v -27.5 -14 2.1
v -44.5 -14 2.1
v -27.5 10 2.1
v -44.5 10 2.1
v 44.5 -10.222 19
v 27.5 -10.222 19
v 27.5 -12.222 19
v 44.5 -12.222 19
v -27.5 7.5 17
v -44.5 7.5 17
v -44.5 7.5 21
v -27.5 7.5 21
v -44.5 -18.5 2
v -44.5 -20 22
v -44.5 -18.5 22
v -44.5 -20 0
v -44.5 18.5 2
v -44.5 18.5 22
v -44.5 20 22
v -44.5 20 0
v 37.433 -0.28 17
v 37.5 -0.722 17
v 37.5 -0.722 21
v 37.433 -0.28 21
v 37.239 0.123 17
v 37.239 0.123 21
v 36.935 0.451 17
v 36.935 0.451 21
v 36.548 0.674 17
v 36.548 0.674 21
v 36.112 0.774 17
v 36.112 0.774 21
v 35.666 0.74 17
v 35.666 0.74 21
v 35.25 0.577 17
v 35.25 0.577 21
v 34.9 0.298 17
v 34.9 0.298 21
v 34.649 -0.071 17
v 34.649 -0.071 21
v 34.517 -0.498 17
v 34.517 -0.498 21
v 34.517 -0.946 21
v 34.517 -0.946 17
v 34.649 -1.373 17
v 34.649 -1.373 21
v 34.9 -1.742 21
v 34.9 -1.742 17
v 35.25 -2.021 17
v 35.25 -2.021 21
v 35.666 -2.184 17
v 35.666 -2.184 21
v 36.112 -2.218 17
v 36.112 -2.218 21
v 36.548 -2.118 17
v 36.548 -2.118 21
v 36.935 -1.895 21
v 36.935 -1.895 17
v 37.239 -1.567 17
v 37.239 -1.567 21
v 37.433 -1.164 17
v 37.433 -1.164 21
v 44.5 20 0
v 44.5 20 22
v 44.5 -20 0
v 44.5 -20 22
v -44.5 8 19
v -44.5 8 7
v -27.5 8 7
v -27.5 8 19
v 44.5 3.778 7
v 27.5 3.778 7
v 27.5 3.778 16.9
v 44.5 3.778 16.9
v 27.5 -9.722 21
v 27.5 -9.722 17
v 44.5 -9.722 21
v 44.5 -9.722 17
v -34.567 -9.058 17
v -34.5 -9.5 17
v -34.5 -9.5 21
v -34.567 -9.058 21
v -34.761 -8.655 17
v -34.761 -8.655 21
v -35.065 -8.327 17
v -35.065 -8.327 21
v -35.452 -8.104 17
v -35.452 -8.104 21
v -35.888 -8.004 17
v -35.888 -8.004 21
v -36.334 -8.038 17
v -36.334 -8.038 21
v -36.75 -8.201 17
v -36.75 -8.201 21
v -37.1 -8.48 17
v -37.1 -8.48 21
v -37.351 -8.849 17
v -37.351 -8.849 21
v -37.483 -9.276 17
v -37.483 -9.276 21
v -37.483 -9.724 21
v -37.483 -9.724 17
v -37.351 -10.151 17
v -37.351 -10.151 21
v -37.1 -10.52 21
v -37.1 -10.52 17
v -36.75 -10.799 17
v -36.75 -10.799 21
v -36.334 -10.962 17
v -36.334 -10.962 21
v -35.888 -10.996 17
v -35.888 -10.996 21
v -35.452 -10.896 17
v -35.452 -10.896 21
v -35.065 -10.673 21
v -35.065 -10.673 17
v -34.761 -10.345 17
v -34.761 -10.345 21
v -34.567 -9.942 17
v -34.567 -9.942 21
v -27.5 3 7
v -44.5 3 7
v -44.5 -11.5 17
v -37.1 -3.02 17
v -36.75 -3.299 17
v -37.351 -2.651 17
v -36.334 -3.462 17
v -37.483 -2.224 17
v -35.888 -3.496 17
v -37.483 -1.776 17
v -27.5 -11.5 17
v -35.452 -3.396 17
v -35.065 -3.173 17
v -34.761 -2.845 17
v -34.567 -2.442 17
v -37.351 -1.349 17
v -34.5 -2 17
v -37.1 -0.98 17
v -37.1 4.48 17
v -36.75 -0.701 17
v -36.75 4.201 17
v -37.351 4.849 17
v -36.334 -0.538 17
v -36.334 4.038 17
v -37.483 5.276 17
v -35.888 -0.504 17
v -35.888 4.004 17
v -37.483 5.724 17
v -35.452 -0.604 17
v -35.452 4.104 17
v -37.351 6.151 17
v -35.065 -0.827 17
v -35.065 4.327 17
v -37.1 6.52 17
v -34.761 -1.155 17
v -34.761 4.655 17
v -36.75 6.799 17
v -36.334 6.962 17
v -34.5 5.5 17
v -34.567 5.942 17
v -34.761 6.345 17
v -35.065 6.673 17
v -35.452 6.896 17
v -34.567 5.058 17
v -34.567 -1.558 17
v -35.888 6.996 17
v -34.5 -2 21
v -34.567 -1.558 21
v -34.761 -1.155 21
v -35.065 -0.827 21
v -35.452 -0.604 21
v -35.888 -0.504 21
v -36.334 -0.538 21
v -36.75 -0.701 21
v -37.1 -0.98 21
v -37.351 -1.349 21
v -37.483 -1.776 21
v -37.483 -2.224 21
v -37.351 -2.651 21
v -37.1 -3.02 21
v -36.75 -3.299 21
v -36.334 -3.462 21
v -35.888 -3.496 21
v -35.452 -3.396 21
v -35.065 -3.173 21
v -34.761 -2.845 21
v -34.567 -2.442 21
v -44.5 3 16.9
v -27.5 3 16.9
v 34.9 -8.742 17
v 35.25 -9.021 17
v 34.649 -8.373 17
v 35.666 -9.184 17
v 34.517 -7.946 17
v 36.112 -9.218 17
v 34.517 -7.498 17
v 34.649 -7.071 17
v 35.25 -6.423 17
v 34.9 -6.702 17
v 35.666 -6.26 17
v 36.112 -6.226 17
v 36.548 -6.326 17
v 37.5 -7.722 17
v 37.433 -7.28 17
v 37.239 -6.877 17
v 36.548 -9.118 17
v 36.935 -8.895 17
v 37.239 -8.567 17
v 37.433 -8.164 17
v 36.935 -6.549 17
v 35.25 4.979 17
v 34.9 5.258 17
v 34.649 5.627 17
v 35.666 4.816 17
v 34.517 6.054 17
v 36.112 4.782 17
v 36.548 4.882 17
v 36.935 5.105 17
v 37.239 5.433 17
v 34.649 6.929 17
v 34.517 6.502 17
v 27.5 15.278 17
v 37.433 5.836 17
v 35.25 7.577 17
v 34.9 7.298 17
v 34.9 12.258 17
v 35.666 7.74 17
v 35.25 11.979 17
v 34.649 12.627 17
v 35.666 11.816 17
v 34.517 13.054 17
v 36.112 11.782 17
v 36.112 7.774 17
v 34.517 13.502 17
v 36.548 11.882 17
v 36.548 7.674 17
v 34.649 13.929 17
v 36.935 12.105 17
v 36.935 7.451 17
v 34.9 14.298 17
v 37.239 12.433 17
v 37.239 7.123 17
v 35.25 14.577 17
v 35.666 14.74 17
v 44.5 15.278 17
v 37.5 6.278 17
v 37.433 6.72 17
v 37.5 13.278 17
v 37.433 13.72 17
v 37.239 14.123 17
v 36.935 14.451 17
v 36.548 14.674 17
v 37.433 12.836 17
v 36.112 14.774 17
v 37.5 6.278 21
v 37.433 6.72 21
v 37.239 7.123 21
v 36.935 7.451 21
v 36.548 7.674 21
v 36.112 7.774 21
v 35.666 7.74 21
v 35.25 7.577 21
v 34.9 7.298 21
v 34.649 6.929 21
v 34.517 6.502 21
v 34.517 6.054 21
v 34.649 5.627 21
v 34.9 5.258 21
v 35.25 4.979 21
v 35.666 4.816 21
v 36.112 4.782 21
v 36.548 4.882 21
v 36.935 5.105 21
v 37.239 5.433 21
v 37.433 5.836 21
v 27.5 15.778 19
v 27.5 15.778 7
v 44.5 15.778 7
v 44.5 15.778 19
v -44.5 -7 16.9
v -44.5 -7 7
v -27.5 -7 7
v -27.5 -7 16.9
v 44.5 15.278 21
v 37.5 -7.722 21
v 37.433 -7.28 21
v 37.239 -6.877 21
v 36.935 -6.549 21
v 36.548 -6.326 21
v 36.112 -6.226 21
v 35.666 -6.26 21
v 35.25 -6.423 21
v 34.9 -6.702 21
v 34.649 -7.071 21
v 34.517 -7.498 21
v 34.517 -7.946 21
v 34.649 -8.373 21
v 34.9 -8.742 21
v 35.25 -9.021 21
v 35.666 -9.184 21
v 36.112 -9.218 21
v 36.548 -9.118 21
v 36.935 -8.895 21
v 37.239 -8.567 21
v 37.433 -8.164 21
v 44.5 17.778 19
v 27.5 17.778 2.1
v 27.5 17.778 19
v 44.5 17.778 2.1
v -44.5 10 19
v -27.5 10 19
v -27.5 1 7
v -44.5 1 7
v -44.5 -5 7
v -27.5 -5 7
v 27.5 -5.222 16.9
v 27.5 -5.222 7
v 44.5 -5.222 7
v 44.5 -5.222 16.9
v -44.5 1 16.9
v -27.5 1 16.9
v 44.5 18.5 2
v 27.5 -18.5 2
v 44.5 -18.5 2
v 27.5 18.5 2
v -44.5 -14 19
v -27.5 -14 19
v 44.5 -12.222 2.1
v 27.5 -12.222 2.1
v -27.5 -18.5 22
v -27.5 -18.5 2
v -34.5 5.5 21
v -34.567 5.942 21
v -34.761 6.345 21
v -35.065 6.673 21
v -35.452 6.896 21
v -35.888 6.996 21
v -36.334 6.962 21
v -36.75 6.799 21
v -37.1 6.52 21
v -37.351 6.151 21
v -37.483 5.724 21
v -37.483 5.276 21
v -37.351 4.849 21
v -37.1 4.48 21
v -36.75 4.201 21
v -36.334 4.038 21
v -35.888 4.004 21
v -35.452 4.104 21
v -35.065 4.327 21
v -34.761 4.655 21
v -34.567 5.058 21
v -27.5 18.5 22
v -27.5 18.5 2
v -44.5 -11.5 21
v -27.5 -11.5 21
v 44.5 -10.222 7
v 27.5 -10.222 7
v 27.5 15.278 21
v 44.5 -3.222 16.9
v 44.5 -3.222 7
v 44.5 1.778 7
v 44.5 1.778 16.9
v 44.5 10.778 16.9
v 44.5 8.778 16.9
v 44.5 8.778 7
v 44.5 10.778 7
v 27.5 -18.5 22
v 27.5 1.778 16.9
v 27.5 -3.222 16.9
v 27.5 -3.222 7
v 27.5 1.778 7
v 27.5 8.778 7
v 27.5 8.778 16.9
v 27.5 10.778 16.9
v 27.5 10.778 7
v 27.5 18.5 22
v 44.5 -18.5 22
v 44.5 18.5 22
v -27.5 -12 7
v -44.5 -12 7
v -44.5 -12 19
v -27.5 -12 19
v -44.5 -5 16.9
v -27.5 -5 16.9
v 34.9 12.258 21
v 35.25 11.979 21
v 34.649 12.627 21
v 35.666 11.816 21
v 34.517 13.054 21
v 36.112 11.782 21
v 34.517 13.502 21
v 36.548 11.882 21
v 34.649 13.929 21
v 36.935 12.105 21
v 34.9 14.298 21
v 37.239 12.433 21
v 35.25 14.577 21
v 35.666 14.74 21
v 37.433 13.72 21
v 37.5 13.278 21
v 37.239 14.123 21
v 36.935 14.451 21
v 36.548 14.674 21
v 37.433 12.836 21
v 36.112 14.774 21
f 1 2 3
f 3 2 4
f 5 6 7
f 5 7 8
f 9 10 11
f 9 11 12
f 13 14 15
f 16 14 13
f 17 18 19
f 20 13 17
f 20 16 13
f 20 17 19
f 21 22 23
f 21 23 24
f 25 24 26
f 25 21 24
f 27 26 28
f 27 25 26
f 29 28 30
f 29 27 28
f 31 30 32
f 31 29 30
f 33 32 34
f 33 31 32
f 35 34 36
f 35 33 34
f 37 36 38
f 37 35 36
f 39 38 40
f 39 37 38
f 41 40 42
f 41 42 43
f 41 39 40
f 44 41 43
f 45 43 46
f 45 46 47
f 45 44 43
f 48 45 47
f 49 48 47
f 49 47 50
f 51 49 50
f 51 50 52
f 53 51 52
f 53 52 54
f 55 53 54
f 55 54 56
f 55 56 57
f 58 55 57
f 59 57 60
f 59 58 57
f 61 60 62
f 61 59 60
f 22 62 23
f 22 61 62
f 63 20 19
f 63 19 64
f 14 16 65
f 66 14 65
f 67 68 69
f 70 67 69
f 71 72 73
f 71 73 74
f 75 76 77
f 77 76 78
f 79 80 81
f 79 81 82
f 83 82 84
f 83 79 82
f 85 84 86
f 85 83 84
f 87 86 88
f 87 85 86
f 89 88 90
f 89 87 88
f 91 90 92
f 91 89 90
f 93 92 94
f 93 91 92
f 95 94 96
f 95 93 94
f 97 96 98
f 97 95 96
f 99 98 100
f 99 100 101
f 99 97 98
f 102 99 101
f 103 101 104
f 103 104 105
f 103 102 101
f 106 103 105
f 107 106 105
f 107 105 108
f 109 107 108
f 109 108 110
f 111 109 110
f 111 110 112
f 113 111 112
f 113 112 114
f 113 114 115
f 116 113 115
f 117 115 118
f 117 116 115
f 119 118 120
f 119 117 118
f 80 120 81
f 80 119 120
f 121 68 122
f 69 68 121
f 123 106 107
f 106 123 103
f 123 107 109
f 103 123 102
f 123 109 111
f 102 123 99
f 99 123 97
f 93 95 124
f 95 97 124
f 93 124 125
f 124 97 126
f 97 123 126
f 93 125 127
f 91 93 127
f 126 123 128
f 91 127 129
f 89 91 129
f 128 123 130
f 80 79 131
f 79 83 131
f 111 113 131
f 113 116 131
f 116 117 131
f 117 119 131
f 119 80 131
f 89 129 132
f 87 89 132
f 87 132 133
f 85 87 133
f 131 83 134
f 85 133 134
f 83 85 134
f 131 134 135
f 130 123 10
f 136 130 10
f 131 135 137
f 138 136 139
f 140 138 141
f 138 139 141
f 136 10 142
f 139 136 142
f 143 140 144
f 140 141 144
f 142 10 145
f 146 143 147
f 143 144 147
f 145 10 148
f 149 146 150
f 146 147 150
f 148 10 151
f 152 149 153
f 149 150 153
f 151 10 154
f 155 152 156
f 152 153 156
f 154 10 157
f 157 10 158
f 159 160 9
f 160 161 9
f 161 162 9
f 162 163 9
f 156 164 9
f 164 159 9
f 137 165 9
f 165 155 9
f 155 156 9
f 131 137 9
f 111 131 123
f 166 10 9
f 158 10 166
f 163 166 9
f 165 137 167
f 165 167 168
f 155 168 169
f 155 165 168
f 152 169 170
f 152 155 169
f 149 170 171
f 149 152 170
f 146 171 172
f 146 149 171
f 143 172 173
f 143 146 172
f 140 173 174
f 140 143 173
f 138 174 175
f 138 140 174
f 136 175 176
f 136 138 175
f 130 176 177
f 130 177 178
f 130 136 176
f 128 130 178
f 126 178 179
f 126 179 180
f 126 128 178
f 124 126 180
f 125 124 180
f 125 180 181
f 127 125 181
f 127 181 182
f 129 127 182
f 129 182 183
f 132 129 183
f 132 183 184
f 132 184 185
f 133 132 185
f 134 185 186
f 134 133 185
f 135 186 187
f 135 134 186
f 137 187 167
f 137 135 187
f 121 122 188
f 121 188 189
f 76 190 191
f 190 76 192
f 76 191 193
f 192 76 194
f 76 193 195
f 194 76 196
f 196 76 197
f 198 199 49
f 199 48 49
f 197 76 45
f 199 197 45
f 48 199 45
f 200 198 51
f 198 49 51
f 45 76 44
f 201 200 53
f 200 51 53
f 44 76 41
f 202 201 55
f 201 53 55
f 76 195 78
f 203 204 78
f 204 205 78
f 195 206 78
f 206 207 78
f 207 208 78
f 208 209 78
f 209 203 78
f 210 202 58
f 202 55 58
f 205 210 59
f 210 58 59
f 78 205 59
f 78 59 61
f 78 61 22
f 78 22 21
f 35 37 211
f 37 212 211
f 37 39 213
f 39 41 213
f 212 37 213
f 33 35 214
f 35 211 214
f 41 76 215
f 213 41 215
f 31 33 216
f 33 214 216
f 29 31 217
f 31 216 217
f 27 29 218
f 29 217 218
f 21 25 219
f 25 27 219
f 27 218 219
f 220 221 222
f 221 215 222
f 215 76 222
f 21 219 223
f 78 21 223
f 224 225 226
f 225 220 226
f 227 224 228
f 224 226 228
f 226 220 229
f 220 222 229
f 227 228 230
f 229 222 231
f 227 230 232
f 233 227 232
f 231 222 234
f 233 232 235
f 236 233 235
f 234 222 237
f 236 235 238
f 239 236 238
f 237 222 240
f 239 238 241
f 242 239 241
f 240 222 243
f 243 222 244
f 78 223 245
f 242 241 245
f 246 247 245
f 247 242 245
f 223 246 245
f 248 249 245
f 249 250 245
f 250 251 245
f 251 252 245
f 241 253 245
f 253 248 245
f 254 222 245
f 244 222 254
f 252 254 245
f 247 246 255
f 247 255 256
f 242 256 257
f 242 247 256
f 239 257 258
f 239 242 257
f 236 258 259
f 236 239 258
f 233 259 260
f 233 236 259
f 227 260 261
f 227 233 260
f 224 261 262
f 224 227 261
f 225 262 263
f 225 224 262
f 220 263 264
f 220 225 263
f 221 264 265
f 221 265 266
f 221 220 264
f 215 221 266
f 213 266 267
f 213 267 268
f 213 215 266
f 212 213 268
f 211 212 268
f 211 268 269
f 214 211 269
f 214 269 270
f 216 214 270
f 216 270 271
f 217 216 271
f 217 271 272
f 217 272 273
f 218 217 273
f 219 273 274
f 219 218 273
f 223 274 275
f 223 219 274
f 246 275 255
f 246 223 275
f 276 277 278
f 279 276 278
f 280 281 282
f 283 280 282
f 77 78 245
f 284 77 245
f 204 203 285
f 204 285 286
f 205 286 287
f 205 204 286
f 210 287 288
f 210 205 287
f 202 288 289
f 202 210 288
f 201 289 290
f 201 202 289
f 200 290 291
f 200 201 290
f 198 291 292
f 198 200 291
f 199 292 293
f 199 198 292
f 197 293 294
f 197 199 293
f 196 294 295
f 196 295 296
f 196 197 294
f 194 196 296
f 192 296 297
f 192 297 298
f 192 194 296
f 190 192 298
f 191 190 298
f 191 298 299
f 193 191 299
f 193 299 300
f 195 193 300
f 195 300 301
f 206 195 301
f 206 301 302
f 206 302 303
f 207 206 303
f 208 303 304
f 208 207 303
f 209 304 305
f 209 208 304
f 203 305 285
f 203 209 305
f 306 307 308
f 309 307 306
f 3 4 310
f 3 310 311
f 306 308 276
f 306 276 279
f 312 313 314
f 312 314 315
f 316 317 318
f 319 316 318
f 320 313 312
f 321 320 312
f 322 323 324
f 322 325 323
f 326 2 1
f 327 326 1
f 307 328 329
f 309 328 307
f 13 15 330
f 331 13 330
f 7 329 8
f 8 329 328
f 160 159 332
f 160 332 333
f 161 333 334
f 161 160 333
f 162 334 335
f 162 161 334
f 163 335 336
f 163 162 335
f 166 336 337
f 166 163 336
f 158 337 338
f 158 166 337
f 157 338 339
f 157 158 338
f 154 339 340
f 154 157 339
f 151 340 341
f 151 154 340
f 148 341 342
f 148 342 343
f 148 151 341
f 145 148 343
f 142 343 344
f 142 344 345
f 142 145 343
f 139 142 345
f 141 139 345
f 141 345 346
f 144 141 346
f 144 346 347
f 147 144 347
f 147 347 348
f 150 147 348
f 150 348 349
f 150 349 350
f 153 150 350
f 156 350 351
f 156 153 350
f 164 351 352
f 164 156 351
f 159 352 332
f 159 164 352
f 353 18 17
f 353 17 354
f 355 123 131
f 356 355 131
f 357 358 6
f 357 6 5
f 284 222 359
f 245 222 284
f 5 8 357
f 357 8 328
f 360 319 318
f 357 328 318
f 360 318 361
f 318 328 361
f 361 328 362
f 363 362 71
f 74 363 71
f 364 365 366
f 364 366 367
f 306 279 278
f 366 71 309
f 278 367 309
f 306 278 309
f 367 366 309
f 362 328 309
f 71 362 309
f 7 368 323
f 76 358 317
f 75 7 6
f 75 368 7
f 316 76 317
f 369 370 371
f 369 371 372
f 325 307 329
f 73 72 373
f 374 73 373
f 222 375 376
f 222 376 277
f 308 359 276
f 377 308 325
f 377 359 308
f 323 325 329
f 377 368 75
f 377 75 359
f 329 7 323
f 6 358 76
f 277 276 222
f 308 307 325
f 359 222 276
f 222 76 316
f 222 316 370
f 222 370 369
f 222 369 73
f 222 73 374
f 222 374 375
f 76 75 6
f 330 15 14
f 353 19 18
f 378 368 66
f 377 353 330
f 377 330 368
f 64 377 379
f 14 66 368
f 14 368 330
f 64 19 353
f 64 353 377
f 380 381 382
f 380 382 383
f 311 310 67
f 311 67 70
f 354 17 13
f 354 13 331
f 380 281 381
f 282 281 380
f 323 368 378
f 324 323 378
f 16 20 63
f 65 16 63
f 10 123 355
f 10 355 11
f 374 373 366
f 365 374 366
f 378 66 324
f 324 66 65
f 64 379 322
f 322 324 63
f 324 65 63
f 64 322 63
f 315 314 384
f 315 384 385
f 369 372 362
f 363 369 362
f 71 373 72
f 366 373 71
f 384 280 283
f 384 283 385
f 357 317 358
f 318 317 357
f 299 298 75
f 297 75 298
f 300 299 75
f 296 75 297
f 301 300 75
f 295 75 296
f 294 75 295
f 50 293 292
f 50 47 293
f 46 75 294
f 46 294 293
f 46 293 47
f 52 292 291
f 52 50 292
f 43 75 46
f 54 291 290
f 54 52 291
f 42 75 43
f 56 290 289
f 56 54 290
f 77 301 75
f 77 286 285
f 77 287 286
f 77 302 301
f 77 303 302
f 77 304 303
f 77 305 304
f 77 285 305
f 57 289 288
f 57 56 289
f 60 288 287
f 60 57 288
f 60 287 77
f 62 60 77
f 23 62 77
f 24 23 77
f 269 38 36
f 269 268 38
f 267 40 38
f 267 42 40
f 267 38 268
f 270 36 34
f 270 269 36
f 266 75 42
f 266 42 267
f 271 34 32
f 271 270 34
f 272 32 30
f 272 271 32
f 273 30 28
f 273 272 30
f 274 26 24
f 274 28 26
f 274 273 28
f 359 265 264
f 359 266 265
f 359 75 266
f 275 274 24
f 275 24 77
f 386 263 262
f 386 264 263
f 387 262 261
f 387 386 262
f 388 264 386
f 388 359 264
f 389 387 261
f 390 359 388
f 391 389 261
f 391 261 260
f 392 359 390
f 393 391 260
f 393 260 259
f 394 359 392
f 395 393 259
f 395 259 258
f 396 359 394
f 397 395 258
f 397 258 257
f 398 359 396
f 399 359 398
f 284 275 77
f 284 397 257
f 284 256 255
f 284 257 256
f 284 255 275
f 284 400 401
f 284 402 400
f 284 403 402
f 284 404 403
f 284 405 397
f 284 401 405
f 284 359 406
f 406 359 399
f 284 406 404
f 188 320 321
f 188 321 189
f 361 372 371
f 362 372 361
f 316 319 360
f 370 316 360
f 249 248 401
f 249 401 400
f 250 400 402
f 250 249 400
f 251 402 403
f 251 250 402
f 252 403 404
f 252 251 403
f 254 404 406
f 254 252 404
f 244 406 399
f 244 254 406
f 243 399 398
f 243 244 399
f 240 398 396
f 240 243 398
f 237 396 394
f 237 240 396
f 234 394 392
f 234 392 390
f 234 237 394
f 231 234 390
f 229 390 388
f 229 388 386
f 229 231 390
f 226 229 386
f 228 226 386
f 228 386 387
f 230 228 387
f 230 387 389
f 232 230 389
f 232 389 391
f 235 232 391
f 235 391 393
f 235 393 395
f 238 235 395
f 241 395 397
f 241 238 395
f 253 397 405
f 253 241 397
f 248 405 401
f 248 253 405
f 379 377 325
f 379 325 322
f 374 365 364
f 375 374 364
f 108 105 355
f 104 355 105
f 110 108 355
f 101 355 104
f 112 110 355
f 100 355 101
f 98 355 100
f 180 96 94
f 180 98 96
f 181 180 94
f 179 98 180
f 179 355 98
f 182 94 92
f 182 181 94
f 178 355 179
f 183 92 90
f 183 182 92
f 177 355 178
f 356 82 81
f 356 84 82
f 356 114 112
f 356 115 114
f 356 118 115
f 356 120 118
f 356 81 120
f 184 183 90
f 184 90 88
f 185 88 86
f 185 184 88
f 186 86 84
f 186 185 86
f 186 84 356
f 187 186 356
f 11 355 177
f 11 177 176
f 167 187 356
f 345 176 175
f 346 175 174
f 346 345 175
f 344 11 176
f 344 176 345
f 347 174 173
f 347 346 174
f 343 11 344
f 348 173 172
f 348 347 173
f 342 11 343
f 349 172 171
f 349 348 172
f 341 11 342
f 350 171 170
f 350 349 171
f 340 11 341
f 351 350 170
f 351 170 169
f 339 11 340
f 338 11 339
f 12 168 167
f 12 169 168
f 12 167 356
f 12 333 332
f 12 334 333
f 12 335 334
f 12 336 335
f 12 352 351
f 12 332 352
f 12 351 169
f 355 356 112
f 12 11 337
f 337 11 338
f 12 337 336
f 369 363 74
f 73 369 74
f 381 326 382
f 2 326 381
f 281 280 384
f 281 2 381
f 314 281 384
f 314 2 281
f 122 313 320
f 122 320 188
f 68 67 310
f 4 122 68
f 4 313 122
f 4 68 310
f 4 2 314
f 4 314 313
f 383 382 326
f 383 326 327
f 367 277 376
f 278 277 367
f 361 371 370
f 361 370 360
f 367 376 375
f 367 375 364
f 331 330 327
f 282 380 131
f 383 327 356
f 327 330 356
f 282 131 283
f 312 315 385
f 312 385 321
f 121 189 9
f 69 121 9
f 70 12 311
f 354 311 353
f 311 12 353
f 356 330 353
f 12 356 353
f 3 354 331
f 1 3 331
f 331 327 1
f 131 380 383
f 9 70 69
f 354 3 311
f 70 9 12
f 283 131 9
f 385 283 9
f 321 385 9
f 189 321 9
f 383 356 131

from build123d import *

# Parameters (mm, degrees)
SKETCH1_W                 = 89
SKETCH1_H                 = 40
BOSS_EXTRUDE1_DEPTH       = 22
SKETCH2_W                 = 17
SKETCH2_H                 = 37
CUT_EXTRUDE1_DEPTH        = 20
SKETCH3_W                 = 17
SKETCH3_H                 = 2
BOSS_EXTRUDE2_DEPTH       = 17
BOSS_EXTRUDE10_DEPTH      = 2
BOSS_EXTRUDE10_DEPTH_BACK = 2
SKETCH4_W                 = 17
SKETCH4_H                 = 19
SKETCH4_R                 = 1.5
SKETCH5_W                 = 17
SKETCH5_H                 = 2
BOSS_EXTRUDE11_DEPTH      = 17
BOSS_EXTRUDE13_DEPTH      = 2
BOSS_EXTRUDE13_DEPTH_BACK = 2
SKETCH6_W                 = 17
SKETCH6_H                 = 25
SKETCH6_R                 = 1.5
SKETCH7_W                 = 0.1
SKETCH7_H                 = 2
CUT_EXTRUDE2_DEPTH        = 17
SKETCH8_W                 = 0.1
SKETCH8_H                 = 2
CUT_EXTRUDE11_DEPTH       = 17
SKETCH10_W                = 17
SKETCH10_H                = 5
SKETCH10_H_2              = 6
BOSS_EXTRUDE14_DEPTH      = 5
SKETCH11_W                = 0.1
SKETCH11_H                = 20
CUT_EXTRUDE12_DEPTH       = 17
SKETCH12_W                = 17
SKETCH12_H                = 5
BOSS_EXTRUDE15_DEPTH      = 5
SKETCH13_W                = 0.1
SKETCH13_H                = 26
CUT_EXTRUDE13_DEPTH       = 17


with BuildPart() as part:
    # Sketch1 → Boss-Extrude1 (new body)
    with BuildSketch(Plane.XY):
        Rectangle(SKETCH1_W, SKETCH1_H)
    extrude(amount=BOSS_EXTRUDE1_DEPTH)

    # Sketch2 → Cut-Extrude1 (cut)
    with BuildSketch(Plane.XY.offset(22)):
        with Locations((-36, 0)):
            Rectangle(SKETCH2_W, SKETCH2_H)
        with Locations((36, 0)):
            Rectangle(SKETCH2_W, SKETCH2_H)
    extrude(amount=-CUT_EXTRUDE1_DEPTH, mode=Mode.SUBTRACT)

    # Sketch3 → Boss-Extrude2 (add)
    with BuildSketch(Plane.XY.offset(2)):
        with Locations((-36, 9)):
            Rectangle(SKETCH3_W, SKETCH3_H)
        with Locations((-36, 2)):
            Rectangle(SKETCH3_W, SKETCH3_H)
        with Locations((-36, -6)):
            Rectangle(SKETCH3_W, SKETCH3_H)
        with Locations((-36, -13)):
            Rectangle(SKETCH3_W, SKETCH3_H)
    extrude(amount=BOSS_EXTRUDE2_DEPTH)

    # Sketch4 → Boss-Extrude10 (add, two sides: drawn at the far end of the back side and taken through both)
    with BuildSketch(Plane.XY.offset(19).offset(-BOSS_EXTRUDE10_DEPTH_BACK)):
        with Locations((-36, -2)):
            Rectangle(SKETCH4_W, SKETCH4_H)
        with Locations((-36, 5.5)):
            Circle(SKETCH4_R, mode=Mode.SUBTRACT)
        with Locations((-36, -2)):
            Circle(SKETCH4_R, mode=Mode.SUBTRACT)
        with Locations((-36, -9.5)):
            Circle(SKETCH4_R, mode=Mode.SUBTRACT)
    extrude(amount=BOSS_EXTRUDE10_DEPTH + BOSS_EXTRUDE10_DEPTH_BACK)

    # Sketch5 → Boss-Extrude11 (add)
    with BuildSketch(Plane.XY.offset(2)):
        with Locations((36, 16.778017119)):
            Rectangle(SKETCH5_W, SKETCH5_H)
        with Locations((36, 9.778017119)):
            Rectangle(SKETCH5_W, SKETCH5_H)
        with Locations((36, 2.778017119)):
            Rectangle(SKETCH5_W, SKETCH5_H)
        with Locations((36, -4.221982881)):
            Rectangle(SKETCH5_W, SKETCH5_H)
        with Locations((36, -11.221982881)):
            Rectangle(SKETCH5_W, SKETCH5_H)
    extrude(amount=BOSS_EXTRUDE11_DEPTH)

    # Sketch6 → Boss-Extrude13 (add, two sides: drawn at the far end of the back side and taken through both)
    with BuildSketch(Plane.XY.offset(19).offset(-BOSS_EXTRUDE13_DEPTH_BACK)):
        with Locations((36, 2.778017119)):
            Rectangle(SKETCH6_W, SKETCH6_H)
        with Locations((36, 13.278017119)):
            Circle(SKETCH6_R, mode=Mode.SUBTRACT)
        with Locations((36, 6.278017119)):
            Circle(SKETCH6_R, mode=Mode.SUBTRACT)
        with Locations((36, -0.721982881)):
            Circle(SKETCH6_R, mode=Mode.SUBTRACT)
        with Locations((36, -7.721982881)):
            Circle(SKETCH6_R, mode=Mode.SUBTRACT)
    extrude(amount=BOSS_EXTRUDE13_DEPTH + BOSS_EXTRUDE13_DEPTH_BACK)

    # Sketch7 → Cut-Extrude2 (cut)
    with BuildSketch(Plane.ZY.offset(44.5)):
        with Locations((2.05, 9)):
            Rectangle(SKETCH7_W, SKETCH7_H)
        with Locations((2.05, 2)):
            Rectangle(SKETCH7_W, SKETCH7_H)
        with Locations((2.05, -6)):
            Rectangle(SKETCH7_W, SKETCH7_H)
        with Locations((2.05, -13)):
            Rectangle(SKETCH7_W, SKETCH7_H)
        with Locations((16.95, -6)):
            Rectangle(SKETCH7_W, SKETCH7_H)
        with Locations((16.95, 2)):
            Rectangle(SKETCH7_W, SKETCH7_H)
    extrude(amount=-CUT_EXTRUDE2_DEPTH, mode=Mode.SUBTRACT)

    # Sketch8 → Cut-Extrude11 (cut)
    with BuildSketch(Plane(origin=(44.5, 0, 0), x_dir=(0, 0, -1), z_dir=(1, 0, 0))):
        with Locations((-2.05, -4.221982881)):
            Rectangle(SKETCH8_W, SKETCH8_H)
        with Locations((-16.95, -4.221982881)):
            Rectangle(SKETCH8_W, SKETCH8_H)
        with Locations((-16.95, 2.778017119)):
            Rectangle(SKETCH8_W, SKETCH8_H)
        with Locations((-16.95, 9.778017119)):
            Rectangle(SKETCH8_W, SKETCH8_H)
        with Locations((-2.05, 16.778017119)):
            Rectangle(SKETCH8_W, SKETCH8_H)
        with Locations((-2.05, 9.778017119)):
            Rectangle(SKETCH8_W, SKETCH8_H)
        with Locations((-2.05, 2.778017119)):
            Rectangle(SKETCH8_W, SKETCH8_H)
        with Locations((-2.05, -11.221982881)):
            Rectangle(SKETCH8_W, SKETCH8_H)
    extrude(amount=-CUT_EXTRUDE11_DEPTH, mode=Mode.SUBTRACT)

    # Sketch10 → Boss-Extrude14 (add)
    with BuildSketch(Plane.XY.offset(2)):
        with Locations((-36, 5.5)):
            Rectangle(SKETCH10_W, SKETCH10_H)
        with Locations((-36, -2)):
            Rectangle(SKETCH10_W, SKETCH10_H_2)
        with Locations((-36, -9.5)):
            Rectangle(SKETCH10_W, SKETCH10_H)
    extrude(amount=BOSS_EXTRUDE14_DEPTH)

    # Sketch11 → Cut-Extrude12 (cut)
    with BuildSketch(Plane.ZY.offset(44.5)):
        with Locations((2.05, -2)):
            Rectangle(SKETCH11_W, SKETCH11_H)
    extrude(amount=-CUT_EXTRUDE12_DEPTH, mode=Mode.SUBTRACT)

    # Sketch12 → Boss-Extrude15 (add)
    with BuildSketch(Plane.XY.offset(2)):
        with Locations((36, 13.278017119)):
            Rectangle(SKETCH12_W, SKETCH12_H)
        with Locations((36, 6.278017119)):
            Rectangle(SKETCH12_W, SKETCH12_H)
        with Locations((36, -0.721982881)):
            Rectangle(SKETCH12_W, SKETCH12_H)
        with Locations((36, -7.721982881)):
            Rectangle(SKETCH12_W, SKETCH12_H)
    extrude(amount=BOSS_EXTRUDE15_DEPTH)

    # Sketch13 → Cut-Extrude13 (cut)
    with BuildSketch(Plane(origin=(44.5, 0, 0), x_dir=(0, 0, -1), z_dir=(1, 0, 0))):
        with Locations((-2.05, 2.778017119)):
            Rectangle(SKETCH13_W, SKETCH13_H)
    extrude(amount=-CUT_EXTRUDE13_DEPTH, mode=Mode.SUBTRACT)


solid = part.part
